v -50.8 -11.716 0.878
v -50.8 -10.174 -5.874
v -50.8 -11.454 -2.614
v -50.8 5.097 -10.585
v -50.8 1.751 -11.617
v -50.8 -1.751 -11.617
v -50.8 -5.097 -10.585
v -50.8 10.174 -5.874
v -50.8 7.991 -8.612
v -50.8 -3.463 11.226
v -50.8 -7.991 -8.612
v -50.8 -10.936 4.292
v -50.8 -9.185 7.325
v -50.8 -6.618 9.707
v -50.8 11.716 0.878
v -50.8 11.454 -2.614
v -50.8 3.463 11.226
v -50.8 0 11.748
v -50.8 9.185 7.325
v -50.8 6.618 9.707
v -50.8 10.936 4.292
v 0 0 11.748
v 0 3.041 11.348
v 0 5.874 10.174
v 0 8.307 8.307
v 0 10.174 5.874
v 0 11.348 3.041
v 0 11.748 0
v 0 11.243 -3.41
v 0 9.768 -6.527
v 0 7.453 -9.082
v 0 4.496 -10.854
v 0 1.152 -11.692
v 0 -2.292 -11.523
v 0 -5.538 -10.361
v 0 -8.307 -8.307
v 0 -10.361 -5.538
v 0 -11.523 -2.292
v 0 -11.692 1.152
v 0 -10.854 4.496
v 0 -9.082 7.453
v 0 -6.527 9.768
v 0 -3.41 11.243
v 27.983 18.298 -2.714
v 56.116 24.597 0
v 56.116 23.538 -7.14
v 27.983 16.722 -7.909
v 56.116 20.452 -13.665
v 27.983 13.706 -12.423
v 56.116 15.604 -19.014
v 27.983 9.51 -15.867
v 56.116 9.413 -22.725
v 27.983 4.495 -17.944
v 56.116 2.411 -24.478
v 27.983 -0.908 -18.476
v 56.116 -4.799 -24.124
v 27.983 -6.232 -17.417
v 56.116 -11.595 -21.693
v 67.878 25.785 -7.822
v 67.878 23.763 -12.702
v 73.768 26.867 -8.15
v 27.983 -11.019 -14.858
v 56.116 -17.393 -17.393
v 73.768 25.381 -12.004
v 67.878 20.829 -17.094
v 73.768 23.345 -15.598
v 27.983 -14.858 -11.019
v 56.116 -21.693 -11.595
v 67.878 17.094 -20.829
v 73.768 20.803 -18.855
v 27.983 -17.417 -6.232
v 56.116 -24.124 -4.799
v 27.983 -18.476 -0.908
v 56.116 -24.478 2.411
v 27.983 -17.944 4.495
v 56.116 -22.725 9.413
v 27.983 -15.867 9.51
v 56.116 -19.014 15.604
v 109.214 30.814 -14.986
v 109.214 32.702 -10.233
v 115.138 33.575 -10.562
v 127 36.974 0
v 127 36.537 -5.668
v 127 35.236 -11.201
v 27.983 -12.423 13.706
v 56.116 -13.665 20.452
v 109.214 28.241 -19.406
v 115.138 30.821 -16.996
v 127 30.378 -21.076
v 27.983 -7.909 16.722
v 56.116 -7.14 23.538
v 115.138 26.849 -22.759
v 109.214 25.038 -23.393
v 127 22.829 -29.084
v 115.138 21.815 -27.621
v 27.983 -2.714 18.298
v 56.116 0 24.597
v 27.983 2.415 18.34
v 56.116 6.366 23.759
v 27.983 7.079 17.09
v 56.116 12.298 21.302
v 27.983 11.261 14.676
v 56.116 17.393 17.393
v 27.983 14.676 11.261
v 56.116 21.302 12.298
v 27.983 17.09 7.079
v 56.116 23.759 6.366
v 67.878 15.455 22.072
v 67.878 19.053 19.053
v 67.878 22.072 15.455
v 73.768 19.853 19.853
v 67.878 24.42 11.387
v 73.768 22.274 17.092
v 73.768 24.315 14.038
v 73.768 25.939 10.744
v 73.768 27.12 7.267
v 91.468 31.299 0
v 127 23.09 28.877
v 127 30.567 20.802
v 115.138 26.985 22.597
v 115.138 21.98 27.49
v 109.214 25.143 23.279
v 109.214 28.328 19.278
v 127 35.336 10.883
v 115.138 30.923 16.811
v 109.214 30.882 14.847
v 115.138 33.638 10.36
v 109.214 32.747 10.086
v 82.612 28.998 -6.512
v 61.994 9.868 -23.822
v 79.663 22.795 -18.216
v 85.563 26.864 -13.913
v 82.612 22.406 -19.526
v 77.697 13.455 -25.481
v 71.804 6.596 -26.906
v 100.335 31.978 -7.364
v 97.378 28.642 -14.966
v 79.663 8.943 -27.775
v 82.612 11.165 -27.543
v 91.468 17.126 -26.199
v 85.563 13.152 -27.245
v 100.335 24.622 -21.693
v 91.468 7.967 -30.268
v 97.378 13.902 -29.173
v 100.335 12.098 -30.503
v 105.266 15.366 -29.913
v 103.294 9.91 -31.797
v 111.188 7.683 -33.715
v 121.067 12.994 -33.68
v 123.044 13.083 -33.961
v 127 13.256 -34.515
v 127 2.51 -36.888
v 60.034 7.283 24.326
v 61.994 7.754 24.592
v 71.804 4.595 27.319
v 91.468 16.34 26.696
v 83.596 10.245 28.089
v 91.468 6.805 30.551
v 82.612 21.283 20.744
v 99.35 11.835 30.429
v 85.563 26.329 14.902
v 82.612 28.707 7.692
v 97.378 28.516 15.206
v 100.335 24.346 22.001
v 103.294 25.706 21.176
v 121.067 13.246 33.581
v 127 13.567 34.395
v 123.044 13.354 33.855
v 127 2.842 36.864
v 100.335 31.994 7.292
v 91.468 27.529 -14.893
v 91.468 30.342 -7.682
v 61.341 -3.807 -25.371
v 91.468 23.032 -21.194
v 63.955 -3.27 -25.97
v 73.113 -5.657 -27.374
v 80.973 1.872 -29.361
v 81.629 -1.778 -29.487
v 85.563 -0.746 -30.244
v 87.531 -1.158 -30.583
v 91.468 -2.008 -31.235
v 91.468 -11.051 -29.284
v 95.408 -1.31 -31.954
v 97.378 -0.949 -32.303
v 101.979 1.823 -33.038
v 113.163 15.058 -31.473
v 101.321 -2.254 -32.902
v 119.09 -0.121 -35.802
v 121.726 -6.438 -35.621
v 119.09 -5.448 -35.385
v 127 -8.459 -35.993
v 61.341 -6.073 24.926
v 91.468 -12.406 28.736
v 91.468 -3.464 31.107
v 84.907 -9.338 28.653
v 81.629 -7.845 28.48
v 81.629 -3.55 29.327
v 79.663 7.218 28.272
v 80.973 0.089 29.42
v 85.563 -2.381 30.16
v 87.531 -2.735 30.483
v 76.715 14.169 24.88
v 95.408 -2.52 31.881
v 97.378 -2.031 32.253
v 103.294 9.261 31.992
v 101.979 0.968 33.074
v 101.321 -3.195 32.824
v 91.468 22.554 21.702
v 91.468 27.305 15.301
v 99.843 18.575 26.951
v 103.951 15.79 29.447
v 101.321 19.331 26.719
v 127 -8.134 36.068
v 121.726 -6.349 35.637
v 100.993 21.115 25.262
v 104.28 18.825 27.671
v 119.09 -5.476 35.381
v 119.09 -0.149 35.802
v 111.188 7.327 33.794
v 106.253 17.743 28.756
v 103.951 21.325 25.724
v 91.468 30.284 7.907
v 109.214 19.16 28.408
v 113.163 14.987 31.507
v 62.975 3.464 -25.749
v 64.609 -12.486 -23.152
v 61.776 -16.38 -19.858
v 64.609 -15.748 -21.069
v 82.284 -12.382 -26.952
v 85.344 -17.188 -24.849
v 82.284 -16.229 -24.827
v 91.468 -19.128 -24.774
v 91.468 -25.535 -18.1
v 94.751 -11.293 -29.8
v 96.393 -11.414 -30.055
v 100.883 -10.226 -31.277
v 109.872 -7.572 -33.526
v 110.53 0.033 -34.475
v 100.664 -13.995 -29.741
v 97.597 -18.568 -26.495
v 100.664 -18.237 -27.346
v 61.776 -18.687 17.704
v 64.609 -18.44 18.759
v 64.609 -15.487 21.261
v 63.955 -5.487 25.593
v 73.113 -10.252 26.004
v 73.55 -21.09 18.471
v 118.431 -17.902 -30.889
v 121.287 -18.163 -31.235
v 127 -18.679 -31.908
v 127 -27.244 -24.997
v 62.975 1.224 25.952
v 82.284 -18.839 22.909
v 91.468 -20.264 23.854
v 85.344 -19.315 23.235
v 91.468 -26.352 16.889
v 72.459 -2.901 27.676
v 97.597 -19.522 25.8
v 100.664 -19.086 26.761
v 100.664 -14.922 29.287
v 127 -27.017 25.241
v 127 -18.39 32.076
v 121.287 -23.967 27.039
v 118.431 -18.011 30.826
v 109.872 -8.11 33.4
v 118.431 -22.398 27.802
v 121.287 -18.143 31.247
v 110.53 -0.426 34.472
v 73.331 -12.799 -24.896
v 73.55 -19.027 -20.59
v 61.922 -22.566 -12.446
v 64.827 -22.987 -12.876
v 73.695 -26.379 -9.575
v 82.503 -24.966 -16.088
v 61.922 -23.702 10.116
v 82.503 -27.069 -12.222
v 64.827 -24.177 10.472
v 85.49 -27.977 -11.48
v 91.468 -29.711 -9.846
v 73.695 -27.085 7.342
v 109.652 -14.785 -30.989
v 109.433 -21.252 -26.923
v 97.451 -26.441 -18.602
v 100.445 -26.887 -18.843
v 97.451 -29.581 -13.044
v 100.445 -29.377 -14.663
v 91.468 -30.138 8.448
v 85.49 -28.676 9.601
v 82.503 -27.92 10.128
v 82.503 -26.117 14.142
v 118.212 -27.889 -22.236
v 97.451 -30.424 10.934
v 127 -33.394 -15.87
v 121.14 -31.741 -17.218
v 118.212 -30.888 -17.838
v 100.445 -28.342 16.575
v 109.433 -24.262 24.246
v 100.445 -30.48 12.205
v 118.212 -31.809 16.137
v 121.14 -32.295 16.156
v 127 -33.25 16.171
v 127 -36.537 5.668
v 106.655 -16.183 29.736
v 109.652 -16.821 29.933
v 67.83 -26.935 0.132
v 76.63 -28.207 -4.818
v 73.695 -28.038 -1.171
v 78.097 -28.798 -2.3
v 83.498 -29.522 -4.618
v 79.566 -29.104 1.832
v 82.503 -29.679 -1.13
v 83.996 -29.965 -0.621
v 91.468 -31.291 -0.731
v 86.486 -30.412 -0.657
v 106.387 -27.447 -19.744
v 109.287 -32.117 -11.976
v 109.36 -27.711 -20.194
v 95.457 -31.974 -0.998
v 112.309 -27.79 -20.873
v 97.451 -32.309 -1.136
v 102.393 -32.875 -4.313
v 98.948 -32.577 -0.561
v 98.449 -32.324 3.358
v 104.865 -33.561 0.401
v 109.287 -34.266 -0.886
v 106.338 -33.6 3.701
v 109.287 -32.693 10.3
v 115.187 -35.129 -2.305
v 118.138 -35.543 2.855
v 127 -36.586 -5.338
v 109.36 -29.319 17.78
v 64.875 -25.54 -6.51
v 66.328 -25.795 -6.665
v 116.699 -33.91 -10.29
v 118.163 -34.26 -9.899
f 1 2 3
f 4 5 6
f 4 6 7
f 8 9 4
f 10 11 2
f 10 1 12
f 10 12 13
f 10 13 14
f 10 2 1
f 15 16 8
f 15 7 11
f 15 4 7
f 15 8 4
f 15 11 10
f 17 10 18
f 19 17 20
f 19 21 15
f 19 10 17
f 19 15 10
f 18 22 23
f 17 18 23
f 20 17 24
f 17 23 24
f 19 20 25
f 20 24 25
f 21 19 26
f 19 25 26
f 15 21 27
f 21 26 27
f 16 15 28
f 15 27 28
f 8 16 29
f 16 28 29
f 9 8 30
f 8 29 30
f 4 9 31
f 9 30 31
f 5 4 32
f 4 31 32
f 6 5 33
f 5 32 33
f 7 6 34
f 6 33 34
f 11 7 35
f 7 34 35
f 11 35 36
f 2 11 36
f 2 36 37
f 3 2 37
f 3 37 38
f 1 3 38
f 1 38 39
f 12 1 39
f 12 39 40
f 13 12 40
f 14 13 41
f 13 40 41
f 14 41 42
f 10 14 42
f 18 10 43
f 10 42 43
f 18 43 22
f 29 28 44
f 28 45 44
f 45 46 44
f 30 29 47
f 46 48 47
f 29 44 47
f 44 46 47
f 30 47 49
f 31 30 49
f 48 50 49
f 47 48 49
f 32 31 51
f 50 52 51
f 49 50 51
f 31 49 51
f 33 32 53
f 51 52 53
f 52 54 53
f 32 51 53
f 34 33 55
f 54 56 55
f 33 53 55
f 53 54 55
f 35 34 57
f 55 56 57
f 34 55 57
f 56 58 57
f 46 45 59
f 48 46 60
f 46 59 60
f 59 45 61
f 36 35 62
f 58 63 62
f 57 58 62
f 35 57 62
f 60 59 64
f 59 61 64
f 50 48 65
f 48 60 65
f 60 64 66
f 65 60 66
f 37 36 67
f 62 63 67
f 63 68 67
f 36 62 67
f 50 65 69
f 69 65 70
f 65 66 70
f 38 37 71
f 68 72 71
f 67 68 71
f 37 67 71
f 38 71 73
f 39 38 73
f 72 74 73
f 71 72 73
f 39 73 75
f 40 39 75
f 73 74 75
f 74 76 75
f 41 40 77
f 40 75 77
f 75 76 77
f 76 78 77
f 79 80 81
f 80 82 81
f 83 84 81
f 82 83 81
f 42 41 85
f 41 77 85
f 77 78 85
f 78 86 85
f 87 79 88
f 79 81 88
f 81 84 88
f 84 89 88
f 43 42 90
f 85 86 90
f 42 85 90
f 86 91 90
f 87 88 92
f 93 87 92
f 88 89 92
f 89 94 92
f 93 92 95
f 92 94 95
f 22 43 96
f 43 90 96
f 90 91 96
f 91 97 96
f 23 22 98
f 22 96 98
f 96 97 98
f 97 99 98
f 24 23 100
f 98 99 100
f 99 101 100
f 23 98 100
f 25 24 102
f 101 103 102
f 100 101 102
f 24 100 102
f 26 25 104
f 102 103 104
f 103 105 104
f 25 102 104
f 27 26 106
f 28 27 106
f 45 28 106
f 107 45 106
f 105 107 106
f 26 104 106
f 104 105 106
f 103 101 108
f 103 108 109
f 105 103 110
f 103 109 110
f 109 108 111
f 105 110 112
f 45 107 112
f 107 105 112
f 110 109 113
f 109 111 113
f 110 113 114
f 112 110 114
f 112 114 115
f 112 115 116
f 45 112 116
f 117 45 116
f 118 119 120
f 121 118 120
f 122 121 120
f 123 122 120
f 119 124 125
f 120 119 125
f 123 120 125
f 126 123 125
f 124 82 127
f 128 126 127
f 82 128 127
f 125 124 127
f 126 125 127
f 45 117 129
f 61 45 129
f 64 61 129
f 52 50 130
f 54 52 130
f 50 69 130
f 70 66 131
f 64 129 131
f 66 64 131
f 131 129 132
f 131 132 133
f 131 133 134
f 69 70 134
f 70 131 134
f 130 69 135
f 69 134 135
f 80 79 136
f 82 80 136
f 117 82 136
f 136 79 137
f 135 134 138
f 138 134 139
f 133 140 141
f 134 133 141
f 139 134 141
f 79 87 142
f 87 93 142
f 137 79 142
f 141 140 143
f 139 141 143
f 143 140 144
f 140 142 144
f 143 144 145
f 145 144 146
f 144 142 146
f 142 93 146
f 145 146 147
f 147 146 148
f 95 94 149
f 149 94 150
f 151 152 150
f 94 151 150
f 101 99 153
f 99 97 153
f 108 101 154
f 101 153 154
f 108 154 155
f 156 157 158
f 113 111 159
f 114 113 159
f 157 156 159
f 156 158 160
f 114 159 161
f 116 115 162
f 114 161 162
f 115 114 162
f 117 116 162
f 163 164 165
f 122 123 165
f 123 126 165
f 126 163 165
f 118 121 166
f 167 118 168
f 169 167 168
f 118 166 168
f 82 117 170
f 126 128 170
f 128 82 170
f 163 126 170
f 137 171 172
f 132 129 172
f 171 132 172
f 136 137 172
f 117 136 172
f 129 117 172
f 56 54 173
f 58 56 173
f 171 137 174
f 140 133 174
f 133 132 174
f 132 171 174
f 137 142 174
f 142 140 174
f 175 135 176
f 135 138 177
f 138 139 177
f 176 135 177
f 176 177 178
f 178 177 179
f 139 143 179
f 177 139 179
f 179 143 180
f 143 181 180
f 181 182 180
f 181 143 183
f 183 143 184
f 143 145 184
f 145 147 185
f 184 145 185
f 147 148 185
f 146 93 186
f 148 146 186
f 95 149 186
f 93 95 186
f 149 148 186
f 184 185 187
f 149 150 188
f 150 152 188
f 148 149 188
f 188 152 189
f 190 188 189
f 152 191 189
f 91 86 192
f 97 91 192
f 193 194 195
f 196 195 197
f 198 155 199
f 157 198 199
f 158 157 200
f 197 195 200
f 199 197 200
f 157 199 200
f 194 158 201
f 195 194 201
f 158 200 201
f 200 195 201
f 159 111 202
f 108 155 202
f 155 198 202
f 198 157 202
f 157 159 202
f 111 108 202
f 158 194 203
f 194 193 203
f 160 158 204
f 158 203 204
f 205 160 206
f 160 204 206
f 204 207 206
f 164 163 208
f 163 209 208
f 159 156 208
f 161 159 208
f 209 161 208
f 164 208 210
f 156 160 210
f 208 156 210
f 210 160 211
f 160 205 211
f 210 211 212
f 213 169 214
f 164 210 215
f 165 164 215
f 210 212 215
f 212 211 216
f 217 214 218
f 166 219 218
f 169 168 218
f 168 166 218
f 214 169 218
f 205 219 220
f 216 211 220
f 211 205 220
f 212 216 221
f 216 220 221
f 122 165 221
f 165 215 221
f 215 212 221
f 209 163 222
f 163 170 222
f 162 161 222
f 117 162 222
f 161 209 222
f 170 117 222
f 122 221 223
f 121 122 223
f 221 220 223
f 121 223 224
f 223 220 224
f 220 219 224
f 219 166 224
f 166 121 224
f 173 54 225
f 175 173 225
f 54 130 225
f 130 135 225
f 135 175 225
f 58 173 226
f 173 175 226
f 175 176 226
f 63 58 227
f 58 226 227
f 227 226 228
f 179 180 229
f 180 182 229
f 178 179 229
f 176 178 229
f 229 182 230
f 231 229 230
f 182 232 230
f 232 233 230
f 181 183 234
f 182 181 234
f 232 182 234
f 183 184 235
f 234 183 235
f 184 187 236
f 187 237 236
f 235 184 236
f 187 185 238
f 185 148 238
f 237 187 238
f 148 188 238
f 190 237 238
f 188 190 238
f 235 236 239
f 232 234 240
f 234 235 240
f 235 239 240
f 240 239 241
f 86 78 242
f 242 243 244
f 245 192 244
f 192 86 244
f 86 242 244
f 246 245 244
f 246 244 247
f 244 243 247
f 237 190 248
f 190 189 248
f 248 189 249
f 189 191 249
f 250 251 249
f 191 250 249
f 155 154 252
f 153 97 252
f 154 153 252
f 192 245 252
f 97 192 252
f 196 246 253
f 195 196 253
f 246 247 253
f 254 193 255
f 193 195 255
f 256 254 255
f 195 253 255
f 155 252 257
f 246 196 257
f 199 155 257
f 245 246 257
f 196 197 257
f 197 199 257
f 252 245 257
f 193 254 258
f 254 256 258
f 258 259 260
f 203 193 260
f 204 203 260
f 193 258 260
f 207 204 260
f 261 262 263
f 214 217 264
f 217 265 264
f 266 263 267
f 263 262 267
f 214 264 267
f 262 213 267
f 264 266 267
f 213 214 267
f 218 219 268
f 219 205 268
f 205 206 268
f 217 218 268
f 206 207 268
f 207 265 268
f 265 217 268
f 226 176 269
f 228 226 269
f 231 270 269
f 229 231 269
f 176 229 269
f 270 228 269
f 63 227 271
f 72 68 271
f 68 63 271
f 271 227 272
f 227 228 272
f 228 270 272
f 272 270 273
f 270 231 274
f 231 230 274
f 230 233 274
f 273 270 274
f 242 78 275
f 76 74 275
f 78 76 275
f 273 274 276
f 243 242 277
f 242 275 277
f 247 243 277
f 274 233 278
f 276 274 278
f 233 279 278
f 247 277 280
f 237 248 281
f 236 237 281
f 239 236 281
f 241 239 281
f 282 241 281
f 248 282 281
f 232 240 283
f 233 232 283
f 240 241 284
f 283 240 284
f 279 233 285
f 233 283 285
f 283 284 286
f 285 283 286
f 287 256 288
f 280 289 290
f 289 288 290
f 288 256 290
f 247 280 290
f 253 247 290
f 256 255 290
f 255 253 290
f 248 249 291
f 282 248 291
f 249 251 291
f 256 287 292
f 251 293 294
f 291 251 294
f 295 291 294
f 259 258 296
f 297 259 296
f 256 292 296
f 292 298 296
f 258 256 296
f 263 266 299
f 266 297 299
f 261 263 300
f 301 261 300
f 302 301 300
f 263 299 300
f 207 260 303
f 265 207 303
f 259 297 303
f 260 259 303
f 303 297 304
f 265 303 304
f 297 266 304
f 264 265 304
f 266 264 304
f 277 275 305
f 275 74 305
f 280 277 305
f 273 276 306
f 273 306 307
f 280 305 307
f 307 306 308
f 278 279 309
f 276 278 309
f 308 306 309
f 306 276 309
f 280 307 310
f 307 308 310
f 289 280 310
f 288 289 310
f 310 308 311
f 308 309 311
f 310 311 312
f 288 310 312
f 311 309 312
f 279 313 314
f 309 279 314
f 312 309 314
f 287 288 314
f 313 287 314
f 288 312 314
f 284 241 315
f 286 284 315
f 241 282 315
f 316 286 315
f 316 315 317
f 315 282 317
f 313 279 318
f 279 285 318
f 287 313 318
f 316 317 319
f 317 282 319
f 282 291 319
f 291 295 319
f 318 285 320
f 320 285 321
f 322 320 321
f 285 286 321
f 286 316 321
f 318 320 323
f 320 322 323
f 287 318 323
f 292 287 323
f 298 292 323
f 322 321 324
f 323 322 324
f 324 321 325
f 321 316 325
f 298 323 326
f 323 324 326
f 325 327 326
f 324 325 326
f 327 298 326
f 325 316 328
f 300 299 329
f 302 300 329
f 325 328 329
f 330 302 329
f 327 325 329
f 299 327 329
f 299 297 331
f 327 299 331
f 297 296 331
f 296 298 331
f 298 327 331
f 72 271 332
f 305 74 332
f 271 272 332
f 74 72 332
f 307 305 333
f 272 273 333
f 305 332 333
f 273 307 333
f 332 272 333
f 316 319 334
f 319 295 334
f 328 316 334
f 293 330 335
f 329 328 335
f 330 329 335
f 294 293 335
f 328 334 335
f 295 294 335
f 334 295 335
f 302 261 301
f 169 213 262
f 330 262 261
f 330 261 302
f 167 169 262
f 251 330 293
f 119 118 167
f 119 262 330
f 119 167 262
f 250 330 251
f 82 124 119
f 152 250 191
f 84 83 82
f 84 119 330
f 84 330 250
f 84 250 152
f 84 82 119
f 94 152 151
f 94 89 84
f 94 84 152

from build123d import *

# Parameters (mm, degrees)
SKETCH2_R           = 49.784
BOSS_EXTRUDE1_DEPTH = 203.2
SKETCH3_R           = 11.74839717
BOSS_EXTRUDE2_DEPTH = 50.8
SKETCH4_R           = 54.60446946
CUT_EXTRUDE1_DEPTH  = 382


with BuildPart() as part:
    # Sketch1 → Revolve1 (revolve)
    with BuildSketch(Plane.XY):
        with BuildLine():
            Line((304.8, 49.784), (304.8, 0))
            Line((304.8, 0), (0, 0))
            Line((0, 0), (0, 11.748397173))
            add(Edge.make_bspline(
                [(0, 11.748397173), (0.424160675, 11.855932678), (1.277768006, 12.07173392), (3.085410505, 12.527272667), (5.106222596, 13.032281093), (7.110128552, 13.529344024), (9.159948224, 14.034387922), (11.195444228, 14.532141119), (13.233412884, 15.026861964), (15.805049223, 15.64653599), (18.91026091, 16.387291474), (22.550652523, 17.244690048), (26.727238439, 18.213147263), (31.952168035, 19.405675489), (42.412897925, 21.742539102), (62.333903875, 25.976370199), (110.770450737, 35.225121195), (160.70732909, 42.159920913), (207.702302928, 46.434962608), (245.168015054, 48.368183749), (253.734807707, 48.740972714), (260.161369668, 48.98354131), (264.446272339, 49.130442523), (268.731666265, 49.262530797), (273.017475857, 49.379804553), (277.303691578, 49.48226239), (281.590188304, 49.569903083), (285.329649653, 49.633426545), (288.521672796, 49.67849525), (291.166731437, 49.70980578), (293.263778354, 49.731088433), (295.359186858, 49.74882407), (297.470177021, 49.76301264), (299.535126271, 49.773654103), (301.617177871, 49.780748429), (303.482211221, 49.783408805), (304.362420109, 49.784), (304.8, 49.784)],
                knots=[0.082917815, 0.082917815, 0.082917815, 0.082917815, 0.082917815, 0.088601511, 0.094285207, 0.099968902, 0.105652598, 0.111336294, 0.11701999, 0.122703686, 0.128387381, 0.140005218, 0.151623054, 0.16324089, 0.174858727, 0.198094396, 0.267801409, 0.383979763, 0.709279153, 0.744132659, 0.778986165, 0.790604, 0.802221836, 0.813839671, 0.825457507, 0.837075342, 0.848693177, 0.860311013, 0.871928848, 0.877612544, 0.883296239, 0.888979935, 0.89466363, 0.900347326, 0.906031021, 0.911714717, 0.917398412, 0.917398412, 0.917398412, 0.917398412, 0.917398412], degree=4))
        make_face()
    revolve(axis=Axis((304.8, 0, 0), (-1, 0, 0)))

    # Sketch2 → Boss-Extrude1 (add)
    with BuildSketch(Plane(origin=(304.8, 0, 0), x_dir=(0, 0, -1), z_dir=(1, 0, 0))):
        Circle(SKETCH2_R)
    extrude(amount=BOSS_EXTRUDE1_DEPTH)

    # Sketch3 → Boss-Extrude2 (add)
    with BuildSketch(Plane.ZY):
        Circle(SKETCH3_R)
    extrude(amount=BOSS_EXTRUDE2_DEPTH)

    # Sketch4 → Cut-Extrude1 (cut, through all)
    with BuildSketch(Plane(origin=(127, 0, 0), x_dir=(0, 0, -1), z_dir=(1, 0, 0))):
        Circle(SKETCH4_R)
    extrude(amount=CUT_EXTRUDE1_DEPTH, mode=Mode.SUBTRACT)


solid = part.part
